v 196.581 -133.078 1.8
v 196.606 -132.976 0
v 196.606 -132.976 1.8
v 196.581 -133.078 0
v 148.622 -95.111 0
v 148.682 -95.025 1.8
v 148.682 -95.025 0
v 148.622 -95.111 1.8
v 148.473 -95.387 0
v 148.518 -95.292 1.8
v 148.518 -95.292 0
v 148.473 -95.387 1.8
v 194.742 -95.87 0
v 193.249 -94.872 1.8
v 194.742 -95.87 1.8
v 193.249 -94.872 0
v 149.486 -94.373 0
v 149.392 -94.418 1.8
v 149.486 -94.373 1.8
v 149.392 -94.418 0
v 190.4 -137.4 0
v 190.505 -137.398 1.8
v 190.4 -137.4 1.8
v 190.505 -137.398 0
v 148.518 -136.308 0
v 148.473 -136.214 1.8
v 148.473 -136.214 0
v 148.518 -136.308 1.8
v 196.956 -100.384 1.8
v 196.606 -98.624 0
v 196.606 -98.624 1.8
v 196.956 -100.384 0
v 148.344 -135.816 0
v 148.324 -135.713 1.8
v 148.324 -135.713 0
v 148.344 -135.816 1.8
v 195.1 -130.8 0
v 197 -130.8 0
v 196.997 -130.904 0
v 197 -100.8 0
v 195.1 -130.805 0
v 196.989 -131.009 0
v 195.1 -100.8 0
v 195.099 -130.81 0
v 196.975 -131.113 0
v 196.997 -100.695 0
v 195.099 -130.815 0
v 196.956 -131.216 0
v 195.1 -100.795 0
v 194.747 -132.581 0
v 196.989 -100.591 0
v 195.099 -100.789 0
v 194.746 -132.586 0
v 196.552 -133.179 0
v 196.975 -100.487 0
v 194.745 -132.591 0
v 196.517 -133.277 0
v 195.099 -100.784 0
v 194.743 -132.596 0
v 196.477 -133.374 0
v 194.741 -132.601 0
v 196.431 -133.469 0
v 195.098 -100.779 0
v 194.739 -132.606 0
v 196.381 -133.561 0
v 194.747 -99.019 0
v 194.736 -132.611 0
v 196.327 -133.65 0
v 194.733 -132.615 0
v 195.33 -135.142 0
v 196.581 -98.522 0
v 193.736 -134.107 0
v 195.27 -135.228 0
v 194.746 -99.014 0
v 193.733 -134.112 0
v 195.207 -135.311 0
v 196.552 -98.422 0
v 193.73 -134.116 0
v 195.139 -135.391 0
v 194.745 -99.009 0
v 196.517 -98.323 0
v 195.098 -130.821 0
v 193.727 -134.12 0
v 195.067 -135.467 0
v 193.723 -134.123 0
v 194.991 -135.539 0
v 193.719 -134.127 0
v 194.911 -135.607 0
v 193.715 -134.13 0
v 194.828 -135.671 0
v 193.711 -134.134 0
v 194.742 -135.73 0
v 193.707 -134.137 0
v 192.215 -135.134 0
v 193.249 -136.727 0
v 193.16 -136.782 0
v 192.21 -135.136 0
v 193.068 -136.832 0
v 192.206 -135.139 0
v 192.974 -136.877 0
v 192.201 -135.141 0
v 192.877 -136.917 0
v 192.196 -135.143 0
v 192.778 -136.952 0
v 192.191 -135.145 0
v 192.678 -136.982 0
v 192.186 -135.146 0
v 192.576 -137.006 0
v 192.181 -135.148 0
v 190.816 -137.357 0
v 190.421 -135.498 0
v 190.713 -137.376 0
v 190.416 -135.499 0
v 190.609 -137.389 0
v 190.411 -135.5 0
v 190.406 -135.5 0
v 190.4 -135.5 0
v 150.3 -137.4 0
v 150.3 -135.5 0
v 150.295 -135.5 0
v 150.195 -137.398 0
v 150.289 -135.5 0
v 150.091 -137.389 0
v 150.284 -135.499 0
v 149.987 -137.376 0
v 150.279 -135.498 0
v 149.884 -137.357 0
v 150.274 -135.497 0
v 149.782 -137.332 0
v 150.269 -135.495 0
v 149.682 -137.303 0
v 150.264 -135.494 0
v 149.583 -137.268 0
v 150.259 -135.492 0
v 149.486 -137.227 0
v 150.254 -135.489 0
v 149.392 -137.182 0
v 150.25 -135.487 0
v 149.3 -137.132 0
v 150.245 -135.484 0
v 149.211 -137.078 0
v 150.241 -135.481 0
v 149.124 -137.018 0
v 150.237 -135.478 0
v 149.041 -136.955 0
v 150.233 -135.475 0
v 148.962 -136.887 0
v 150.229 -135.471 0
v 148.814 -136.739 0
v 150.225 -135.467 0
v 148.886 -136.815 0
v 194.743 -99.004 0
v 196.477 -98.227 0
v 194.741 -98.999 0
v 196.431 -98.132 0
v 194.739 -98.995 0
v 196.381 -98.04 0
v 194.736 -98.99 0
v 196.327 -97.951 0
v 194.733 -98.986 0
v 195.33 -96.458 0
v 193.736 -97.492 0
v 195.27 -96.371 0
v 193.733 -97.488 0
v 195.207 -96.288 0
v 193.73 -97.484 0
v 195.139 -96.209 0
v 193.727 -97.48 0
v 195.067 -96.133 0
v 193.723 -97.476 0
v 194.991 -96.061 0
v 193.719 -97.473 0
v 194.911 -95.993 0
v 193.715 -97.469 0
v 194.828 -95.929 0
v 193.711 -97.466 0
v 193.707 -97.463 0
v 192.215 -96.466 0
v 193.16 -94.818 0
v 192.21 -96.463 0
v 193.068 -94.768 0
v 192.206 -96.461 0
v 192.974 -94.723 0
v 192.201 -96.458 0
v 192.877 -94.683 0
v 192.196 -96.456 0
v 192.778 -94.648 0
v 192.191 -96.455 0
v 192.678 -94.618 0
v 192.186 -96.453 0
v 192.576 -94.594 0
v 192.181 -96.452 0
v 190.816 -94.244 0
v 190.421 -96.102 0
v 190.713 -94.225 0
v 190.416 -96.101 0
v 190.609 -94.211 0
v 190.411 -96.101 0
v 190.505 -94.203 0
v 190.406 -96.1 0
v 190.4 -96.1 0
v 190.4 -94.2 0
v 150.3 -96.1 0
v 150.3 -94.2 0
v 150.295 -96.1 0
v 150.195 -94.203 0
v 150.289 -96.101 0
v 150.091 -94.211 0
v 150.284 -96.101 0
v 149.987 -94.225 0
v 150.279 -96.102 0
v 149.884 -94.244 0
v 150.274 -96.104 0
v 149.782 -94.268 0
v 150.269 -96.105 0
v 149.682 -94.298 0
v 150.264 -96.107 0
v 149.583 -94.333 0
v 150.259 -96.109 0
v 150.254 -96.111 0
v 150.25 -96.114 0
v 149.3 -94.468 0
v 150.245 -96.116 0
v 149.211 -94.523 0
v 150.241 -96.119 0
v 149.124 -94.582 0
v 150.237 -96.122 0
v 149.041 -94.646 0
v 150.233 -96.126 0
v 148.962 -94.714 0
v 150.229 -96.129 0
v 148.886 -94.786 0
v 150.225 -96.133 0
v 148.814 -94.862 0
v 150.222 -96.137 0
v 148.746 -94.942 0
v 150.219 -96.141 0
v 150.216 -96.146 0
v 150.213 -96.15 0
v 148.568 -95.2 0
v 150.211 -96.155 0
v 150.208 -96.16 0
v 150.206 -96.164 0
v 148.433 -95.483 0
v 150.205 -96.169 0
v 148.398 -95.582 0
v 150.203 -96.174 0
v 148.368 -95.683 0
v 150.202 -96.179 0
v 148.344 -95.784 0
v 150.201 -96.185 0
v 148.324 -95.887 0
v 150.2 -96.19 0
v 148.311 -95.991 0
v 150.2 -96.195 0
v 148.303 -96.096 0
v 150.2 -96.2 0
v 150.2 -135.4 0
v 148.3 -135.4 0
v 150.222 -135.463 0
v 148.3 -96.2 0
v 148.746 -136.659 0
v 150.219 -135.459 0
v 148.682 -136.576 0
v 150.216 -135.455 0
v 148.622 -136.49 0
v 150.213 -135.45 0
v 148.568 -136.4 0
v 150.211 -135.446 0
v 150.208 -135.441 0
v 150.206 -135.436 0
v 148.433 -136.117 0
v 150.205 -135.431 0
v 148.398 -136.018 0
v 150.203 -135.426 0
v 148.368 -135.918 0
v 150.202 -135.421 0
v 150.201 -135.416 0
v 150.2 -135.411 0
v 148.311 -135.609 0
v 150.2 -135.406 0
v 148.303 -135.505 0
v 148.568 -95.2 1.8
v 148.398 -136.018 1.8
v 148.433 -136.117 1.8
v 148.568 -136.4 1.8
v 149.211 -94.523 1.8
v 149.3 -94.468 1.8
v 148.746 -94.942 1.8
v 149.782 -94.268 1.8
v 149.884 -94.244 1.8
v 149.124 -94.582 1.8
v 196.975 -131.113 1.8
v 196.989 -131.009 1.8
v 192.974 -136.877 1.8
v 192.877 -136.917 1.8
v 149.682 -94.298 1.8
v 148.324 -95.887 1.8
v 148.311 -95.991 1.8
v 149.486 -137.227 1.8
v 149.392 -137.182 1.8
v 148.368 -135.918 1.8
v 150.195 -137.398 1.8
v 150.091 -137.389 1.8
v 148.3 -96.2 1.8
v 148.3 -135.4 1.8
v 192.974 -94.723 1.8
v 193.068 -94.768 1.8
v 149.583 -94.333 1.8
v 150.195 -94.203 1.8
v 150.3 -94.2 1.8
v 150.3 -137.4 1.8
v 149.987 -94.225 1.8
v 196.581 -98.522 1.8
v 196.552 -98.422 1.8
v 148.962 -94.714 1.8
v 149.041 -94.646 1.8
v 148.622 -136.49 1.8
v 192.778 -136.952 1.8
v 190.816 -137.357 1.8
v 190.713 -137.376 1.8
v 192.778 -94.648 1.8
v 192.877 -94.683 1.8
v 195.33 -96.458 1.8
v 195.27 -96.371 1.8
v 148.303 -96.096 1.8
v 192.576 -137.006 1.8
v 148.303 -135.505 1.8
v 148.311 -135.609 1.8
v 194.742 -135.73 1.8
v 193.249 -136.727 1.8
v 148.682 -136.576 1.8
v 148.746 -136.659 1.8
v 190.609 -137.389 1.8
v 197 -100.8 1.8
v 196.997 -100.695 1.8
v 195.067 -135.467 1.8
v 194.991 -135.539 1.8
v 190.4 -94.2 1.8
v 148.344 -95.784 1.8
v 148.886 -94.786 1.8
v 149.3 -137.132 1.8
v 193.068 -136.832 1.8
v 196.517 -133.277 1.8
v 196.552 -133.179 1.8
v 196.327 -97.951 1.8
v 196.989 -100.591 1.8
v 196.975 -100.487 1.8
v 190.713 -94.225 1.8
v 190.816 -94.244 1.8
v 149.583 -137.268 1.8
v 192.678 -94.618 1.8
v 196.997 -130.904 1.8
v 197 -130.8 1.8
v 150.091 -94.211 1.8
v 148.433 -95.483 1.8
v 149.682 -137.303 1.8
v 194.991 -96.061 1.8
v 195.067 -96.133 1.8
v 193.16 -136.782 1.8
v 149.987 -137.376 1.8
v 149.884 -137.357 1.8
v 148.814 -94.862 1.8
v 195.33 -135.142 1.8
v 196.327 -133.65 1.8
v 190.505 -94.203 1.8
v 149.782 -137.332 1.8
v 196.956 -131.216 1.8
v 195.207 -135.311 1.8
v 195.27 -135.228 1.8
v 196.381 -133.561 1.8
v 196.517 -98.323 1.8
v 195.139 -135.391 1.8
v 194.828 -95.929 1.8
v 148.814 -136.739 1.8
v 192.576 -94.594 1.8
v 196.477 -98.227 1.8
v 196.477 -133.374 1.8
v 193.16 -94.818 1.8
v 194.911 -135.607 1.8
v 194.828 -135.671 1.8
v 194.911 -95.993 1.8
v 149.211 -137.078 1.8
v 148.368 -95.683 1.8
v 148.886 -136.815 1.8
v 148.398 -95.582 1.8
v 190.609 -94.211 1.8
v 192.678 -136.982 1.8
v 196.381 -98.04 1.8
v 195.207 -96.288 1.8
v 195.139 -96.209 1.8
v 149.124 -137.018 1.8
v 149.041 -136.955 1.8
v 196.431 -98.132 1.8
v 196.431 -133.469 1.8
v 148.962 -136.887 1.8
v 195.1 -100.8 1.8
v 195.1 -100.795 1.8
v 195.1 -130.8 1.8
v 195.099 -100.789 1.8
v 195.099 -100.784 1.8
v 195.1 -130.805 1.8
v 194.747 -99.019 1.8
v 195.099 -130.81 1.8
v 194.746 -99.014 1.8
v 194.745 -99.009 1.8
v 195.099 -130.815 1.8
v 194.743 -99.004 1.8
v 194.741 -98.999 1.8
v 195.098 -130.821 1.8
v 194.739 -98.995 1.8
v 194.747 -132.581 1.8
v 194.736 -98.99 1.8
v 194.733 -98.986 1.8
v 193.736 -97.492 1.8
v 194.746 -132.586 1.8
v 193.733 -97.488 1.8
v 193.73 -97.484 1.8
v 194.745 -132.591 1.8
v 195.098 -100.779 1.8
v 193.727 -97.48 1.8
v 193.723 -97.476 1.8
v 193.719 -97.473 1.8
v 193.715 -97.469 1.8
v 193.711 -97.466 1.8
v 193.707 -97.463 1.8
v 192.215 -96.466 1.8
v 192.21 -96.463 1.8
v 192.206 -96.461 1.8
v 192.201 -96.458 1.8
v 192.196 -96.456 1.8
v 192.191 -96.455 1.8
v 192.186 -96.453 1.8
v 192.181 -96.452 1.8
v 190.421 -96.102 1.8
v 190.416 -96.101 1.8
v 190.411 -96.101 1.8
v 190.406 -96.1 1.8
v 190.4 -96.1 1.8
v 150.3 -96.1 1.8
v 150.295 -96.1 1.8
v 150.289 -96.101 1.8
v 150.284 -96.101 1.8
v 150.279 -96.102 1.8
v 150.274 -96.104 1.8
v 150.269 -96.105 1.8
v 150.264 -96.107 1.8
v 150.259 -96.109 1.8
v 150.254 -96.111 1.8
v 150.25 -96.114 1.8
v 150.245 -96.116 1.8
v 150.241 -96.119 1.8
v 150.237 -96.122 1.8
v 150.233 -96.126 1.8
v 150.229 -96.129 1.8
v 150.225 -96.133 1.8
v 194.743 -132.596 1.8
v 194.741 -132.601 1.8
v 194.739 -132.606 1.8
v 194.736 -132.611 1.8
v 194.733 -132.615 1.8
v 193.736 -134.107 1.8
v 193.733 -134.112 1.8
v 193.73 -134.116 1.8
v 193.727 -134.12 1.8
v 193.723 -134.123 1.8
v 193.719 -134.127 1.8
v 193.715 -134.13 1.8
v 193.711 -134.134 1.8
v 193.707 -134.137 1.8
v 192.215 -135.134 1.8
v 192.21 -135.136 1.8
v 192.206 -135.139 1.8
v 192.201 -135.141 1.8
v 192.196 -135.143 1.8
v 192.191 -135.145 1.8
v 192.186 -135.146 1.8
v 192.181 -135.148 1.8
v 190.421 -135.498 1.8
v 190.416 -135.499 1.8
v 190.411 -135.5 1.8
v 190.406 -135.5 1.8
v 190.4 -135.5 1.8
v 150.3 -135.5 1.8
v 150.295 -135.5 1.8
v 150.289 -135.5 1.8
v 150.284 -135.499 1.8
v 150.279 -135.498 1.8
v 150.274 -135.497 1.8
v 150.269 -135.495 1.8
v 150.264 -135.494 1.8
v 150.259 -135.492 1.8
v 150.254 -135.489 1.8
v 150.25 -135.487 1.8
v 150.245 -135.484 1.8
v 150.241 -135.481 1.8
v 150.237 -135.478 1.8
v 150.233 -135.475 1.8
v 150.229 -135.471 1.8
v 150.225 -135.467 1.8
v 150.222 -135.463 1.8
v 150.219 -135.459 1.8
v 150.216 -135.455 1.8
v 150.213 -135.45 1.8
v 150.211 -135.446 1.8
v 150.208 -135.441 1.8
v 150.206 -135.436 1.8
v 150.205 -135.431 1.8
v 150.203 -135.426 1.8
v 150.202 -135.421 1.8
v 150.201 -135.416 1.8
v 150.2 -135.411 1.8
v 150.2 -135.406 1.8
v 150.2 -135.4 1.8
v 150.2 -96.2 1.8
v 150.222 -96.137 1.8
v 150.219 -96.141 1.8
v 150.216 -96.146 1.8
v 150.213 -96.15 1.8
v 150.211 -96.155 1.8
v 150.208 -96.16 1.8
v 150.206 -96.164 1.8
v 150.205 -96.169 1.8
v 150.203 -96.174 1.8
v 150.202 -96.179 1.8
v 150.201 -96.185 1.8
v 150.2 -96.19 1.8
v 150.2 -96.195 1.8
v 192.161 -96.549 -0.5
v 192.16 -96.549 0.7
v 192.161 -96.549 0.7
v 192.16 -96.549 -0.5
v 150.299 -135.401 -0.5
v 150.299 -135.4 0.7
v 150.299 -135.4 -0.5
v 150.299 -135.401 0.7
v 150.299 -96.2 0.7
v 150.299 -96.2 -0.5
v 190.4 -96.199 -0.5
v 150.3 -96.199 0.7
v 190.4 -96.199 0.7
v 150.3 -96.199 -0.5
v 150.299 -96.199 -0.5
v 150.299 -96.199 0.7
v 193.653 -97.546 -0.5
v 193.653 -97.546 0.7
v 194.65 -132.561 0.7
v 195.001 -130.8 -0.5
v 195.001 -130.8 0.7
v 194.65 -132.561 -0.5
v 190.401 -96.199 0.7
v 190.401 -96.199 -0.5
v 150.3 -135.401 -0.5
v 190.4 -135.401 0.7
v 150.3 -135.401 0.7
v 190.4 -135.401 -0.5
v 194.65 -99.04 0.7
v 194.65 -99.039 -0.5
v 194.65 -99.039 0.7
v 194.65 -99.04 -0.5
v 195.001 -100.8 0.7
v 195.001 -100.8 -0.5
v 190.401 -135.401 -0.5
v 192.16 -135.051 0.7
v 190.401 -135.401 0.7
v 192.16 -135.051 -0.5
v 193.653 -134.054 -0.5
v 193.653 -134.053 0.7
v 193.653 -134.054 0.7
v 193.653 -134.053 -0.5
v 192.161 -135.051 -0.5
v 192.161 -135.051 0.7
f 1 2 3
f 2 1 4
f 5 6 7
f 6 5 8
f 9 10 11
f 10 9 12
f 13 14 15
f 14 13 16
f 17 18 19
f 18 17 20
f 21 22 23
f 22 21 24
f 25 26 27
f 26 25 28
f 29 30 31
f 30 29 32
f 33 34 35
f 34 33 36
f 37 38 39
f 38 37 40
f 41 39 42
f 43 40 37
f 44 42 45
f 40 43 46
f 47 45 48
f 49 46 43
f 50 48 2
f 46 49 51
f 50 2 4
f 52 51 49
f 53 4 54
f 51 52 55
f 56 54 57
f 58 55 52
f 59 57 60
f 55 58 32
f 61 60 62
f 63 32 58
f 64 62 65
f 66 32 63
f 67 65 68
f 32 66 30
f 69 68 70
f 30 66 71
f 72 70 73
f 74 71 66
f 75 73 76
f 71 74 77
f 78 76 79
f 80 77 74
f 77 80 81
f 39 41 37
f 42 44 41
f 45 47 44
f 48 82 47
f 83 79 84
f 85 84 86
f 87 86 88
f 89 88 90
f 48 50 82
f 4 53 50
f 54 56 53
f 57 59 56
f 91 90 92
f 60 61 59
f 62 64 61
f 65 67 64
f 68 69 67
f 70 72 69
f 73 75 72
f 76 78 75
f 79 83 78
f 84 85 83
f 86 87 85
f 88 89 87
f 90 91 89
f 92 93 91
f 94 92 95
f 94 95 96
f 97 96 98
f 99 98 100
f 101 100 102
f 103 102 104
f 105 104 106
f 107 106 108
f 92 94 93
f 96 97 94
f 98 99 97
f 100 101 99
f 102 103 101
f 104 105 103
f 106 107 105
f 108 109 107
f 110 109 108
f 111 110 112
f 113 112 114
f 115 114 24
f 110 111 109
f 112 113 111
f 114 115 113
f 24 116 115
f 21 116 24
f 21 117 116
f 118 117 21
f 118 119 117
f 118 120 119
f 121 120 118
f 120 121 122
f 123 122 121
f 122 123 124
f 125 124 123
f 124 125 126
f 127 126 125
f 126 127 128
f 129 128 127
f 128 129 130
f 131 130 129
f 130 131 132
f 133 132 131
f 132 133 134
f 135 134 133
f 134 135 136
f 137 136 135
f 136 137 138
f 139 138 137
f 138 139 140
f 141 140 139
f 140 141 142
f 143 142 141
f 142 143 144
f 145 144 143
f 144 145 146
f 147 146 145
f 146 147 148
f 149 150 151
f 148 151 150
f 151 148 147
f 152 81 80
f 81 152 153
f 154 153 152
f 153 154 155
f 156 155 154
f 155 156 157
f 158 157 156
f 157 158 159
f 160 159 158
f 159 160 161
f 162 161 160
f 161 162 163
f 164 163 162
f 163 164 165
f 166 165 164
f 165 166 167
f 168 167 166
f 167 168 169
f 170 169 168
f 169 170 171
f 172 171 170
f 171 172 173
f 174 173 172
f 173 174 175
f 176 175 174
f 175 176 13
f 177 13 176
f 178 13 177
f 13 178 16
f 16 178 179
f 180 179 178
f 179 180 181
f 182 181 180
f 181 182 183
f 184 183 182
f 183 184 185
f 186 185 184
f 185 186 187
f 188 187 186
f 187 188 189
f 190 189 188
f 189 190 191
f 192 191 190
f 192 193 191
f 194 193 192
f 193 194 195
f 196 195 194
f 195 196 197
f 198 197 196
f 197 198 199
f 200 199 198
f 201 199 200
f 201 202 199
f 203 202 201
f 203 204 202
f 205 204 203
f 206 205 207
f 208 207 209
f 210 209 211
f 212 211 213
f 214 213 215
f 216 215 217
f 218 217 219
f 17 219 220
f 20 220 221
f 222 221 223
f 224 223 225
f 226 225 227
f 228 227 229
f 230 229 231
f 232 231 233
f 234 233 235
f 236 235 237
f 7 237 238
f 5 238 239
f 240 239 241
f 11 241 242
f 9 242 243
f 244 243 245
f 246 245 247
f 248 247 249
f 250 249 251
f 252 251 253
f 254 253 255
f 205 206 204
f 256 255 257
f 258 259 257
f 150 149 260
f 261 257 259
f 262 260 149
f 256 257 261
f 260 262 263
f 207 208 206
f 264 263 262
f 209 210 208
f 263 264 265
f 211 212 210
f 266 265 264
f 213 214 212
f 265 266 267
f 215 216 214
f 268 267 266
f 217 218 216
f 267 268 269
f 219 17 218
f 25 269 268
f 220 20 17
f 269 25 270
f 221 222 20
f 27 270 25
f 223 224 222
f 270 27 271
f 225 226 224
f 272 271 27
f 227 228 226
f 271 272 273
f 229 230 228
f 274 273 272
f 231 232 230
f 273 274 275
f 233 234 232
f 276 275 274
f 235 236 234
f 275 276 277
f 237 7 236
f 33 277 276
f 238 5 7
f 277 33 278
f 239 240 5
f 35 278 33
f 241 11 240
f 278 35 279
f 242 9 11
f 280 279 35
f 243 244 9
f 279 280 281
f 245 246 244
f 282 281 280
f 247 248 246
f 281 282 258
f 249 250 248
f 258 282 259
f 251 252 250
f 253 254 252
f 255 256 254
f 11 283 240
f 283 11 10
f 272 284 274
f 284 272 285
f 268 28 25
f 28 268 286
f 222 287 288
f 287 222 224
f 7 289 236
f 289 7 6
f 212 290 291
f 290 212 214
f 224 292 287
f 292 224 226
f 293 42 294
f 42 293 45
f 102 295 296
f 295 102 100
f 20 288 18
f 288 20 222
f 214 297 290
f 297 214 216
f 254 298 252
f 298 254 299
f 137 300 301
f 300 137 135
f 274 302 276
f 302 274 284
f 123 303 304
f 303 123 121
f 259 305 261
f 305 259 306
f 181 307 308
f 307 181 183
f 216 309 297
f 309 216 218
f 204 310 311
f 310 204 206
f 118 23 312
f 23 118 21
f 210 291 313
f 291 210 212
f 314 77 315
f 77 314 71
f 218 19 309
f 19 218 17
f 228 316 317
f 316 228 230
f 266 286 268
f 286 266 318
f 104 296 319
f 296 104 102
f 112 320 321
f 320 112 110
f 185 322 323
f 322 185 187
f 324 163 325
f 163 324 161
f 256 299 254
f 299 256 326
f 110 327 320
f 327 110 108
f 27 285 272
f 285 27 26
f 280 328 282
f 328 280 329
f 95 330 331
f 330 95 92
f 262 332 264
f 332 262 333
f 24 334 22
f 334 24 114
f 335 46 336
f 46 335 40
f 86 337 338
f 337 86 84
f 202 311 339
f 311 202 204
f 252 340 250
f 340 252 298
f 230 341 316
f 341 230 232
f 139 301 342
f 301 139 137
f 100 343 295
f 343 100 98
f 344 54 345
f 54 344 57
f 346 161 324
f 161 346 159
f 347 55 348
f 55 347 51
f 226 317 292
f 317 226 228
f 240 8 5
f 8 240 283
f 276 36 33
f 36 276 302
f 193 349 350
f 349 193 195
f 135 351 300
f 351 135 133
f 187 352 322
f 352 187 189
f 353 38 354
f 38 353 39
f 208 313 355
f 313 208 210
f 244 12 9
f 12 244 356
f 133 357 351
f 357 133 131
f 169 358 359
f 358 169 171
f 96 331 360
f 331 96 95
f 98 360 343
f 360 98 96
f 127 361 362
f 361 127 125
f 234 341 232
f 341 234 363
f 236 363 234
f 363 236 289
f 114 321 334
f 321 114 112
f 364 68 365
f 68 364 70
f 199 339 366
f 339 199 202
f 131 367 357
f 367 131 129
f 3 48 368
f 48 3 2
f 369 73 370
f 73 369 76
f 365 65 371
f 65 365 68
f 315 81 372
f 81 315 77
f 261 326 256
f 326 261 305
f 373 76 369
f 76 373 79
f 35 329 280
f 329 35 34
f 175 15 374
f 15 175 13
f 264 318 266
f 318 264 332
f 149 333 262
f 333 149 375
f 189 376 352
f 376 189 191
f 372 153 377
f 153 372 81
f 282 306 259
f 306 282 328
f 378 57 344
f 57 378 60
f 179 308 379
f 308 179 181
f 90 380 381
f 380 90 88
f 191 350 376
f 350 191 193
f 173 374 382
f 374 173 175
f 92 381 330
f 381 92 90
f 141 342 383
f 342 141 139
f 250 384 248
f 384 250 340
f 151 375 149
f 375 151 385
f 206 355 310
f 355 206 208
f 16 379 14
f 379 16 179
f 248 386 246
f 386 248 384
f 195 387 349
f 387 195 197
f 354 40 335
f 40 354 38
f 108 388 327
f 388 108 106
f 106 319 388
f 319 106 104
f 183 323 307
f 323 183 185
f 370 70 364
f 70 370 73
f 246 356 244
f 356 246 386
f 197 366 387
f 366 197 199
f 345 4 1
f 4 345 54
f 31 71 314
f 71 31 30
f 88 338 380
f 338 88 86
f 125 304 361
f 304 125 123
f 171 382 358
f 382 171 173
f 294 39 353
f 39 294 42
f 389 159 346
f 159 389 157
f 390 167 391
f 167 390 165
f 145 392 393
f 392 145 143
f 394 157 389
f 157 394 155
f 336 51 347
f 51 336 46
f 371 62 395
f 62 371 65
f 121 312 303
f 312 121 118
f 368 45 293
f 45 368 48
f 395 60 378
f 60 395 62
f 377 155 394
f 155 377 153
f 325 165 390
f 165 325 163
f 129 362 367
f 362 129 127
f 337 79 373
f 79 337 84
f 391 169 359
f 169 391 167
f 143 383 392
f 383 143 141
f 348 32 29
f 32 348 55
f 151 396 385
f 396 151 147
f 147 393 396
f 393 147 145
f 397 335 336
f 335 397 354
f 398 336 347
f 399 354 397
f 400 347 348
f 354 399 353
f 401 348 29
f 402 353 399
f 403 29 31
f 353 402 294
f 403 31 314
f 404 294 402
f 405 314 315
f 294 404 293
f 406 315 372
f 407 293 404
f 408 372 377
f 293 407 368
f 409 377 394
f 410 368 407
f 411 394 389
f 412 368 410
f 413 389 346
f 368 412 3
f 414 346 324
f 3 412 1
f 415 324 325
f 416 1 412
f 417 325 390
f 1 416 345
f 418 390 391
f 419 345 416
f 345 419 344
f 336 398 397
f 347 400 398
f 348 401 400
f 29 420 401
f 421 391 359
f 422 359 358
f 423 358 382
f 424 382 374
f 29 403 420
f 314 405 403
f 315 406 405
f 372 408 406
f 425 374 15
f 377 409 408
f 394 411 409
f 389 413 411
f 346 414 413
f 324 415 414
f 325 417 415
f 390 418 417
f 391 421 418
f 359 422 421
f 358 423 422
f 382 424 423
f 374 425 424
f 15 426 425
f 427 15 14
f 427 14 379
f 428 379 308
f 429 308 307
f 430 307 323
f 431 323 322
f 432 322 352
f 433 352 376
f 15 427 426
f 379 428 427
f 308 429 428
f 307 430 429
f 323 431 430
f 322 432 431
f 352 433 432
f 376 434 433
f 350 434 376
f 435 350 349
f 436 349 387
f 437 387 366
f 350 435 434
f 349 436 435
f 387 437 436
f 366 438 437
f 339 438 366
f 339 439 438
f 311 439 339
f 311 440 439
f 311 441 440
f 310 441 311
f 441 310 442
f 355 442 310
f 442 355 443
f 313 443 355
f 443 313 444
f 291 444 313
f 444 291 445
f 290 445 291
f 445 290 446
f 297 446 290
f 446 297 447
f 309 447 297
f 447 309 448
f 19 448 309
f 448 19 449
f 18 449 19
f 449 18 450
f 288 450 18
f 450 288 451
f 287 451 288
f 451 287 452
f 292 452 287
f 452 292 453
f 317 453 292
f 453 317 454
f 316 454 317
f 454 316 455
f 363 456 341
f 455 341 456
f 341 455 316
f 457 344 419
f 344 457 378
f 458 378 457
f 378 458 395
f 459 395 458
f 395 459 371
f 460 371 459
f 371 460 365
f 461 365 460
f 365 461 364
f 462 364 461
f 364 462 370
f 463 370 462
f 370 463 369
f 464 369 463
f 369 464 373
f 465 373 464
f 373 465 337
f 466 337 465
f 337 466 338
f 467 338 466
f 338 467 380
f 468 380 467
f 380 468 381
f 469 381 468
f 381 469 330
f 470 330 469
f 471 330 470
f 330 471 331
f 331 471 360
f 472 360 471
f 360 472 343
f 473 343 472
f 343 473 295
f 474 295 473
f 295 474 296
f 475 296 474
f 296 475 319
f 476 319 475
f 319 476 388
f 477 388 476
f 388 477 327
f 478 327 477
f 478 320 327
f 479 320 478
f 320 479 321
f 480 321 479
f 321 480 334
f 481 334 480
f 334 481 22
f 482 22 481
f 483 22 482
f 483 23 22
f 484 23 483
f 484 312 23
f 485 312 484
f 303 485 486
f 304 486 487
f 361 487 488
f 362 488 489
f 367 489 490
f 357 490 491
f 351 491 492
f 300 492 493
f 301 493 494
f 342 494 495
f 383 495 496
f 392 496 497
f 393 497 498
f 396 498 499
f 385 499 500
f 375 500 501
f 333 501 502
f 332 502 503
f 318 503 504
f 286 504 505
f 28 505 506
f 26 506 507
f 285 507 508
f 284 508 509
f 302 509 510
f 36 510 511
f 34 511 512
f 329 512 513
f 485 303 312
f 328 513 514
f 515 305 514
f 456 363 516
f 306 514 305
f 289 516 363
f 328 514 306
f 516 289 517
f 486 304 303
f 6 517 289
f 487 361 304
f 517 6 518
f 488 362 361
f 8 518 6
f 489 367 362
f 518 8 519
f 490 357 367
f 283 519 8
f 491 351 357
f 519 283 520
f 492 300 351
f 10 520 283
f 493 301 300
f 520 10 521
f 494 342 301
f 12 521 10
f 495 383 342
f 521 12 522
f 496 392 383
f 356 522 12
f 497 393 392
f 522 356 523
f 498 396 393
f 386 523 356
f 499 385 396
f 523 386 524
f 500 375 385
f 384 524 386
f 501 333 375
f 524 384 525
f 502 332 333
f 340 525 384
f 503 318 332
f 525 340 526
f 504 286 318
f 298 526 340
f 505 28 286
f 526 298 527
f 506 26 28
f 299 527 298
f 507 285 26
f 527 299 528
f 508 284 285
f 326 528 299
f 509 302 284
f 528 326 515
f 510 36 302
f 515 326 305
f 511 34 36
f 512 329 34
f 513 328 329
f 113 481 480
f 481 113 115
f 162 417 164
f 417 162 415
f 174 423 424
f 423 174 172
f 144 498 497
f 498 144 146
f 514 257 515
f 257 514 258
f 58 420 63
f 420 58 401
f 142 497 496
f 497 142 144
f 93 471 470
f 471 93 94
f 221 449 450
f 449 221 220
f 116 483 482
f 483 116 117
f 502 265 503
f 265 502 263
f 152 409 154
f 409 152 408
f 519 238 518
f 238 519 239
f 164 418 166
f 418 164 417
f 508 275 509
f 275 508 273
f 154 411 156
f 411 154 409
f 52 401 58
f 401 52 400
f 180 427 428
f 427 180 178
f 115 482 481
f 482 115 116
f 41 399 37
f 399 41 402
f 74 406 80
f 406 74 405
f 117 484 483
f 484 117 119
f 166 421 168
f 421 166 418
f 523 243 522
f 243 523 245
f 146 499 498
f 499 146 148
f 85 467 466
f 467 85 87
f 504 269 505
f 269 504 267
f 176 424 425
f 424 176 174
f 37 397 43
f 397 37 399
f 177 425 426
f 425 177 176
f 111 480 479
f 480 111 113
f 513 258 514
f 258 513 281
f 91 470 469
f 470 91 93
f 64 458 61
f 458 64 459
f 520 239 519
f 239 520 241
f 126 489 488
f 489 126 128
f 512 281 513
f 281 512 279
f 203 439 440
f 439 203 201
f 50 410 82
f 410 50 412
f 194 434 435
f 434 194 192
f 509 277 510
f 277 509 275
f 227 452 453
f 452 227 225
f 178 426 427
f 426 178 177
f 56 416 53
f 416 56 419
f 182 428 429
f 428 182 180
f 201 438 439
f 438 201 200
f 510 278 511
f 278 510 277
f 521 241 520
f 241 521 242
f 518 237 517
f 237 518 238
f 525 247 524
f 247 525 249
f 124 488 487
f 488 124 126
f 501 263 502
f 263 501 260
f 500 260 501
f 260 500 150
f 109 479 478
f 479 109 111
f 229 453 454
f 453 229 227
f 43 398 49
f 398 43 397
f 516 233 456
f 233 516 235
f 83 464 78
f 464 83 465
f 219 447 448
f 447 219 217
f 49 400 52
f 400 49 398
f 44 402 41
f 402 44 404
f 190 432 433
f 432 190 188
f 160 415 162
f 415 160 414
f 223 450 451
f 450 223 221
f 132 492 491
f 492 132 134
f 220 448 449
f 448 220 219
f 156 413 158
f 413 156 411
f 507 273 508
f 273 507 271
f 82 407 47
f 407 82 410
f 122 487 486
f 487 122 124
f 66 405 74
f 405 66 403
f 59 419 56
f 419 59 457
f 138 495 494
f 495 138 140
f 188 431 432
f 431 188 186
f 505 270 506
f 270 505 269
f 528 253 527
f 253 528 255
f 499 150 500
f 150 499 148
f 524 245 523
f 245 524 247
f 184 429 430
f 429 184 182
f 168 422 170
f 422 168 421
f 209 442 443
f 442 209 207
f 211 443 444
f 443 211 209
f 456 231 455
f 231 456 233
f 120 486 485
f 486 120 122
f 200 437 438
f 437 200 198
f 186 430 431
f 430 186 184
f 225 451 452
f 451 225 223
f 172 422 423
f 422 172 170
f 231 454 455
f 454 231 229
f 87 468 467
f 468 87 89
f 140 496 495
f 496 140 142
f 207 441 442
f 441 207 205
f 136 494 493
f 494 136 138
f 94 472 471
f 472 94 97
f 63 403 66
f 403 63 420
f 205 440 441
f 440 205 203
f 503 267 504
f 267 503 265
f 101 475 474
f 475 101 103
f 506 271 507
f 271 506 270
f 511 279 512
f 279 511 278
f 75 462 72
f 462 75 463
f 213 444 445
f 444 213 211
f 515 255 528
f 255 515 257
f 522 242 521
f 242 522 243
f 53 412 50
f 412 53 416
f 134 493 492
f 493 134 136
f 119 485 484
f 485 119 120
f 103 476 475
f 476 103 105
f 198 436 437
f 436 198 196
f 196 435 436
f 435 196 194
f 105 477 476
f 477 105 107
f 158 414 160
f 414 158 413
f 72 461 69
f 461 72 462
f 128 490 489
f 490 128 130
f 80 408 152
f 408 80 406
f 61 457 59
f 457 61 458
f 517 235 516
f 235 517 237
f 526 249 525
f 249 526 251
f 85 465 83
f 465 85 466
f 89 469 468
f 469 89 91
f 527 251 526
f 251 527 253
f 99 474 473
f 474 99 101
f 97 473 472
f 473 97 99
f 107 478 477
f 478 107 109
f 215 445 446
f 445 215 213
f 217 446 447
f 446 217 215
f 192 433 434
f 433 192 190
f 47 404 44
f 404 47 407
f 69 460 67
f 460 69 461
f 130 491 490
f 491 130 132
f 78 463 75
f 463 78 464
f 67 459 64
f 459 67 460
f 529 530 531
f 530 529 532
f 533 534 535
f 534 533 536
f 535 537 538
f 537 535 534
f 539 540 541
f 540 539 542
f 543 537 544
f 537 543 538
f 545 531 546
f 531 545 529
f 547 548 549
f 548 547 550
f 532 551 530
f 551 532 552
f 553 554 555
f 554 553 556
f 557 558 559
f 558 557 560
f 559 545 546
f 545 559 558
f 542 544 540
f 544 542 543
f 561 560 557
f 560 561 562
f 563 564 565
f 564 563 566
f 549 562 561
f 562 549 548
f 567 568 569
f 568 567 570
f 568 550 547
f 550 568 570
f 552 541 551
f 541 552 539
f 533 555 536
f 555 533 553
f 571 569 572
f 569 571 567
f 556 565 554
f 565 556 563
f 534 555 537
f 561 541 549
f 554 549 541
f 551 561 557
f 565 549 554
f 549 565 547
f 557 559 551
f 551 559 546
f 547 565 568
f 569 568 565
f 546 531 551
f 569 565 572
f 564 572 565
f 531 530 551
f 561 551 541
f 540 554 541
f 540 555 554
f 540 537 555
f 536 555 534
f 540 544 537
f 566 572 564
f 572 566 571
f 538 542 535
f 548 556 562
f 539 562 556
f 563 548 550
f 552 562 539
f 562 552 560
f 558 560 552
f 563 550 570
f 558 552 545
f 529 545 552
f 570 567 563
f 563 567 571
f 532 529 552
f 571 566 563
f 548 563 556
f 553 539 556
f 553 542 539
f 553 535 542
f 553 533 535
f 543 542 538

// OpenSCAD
//difference() {
//	cube([44,55,.3]);
//	translate([-1.5,-3,0]) minkowski() {
//		linear_extrude(.3) import("Pulse_Arc_Welder_logic-F.Paste.dxf");
//		cube(.1);
//	}
//}
PCB_thickness = 0.8;
Stencil_thickness = 0.2;
edge_margin = 0.1;
paste_clearance = 0.001;

difference() {
    minkowski(){
        linear_extrude(height = Stencil_thickness, center = false) import("Pulse_Arc_Welder_logic-Edge.Cuts.dxf");
        cylinder(height = 3*Stencil_thickness,r1 = paste_clearance,r2 = paste_clearance,center=true, $fn = 120);
    }
}

difference(){
    minkowski(){
        linear_extrude(Stencil_thickness+PCB_thickness-.1) import("Pulse_Arc_Welder_logic-Edge.Cuts.dxf");
        cylinder(Stencil_thickness+PCB_thickness-.1,2,2,center=false, $fn = 120);
    }
    minkowski(){
        linear_extrude(height = 2*(Stencil_thickness+PCB_thickness), center = true) import("Pulse_Arc_Welder_logic-Edge.Cuts.dxf");
        cylinder(Stencil_thickness+PCB_thickness-.1,edge_margin,edge_margin,center=false, $fn = 120);
    }
}
